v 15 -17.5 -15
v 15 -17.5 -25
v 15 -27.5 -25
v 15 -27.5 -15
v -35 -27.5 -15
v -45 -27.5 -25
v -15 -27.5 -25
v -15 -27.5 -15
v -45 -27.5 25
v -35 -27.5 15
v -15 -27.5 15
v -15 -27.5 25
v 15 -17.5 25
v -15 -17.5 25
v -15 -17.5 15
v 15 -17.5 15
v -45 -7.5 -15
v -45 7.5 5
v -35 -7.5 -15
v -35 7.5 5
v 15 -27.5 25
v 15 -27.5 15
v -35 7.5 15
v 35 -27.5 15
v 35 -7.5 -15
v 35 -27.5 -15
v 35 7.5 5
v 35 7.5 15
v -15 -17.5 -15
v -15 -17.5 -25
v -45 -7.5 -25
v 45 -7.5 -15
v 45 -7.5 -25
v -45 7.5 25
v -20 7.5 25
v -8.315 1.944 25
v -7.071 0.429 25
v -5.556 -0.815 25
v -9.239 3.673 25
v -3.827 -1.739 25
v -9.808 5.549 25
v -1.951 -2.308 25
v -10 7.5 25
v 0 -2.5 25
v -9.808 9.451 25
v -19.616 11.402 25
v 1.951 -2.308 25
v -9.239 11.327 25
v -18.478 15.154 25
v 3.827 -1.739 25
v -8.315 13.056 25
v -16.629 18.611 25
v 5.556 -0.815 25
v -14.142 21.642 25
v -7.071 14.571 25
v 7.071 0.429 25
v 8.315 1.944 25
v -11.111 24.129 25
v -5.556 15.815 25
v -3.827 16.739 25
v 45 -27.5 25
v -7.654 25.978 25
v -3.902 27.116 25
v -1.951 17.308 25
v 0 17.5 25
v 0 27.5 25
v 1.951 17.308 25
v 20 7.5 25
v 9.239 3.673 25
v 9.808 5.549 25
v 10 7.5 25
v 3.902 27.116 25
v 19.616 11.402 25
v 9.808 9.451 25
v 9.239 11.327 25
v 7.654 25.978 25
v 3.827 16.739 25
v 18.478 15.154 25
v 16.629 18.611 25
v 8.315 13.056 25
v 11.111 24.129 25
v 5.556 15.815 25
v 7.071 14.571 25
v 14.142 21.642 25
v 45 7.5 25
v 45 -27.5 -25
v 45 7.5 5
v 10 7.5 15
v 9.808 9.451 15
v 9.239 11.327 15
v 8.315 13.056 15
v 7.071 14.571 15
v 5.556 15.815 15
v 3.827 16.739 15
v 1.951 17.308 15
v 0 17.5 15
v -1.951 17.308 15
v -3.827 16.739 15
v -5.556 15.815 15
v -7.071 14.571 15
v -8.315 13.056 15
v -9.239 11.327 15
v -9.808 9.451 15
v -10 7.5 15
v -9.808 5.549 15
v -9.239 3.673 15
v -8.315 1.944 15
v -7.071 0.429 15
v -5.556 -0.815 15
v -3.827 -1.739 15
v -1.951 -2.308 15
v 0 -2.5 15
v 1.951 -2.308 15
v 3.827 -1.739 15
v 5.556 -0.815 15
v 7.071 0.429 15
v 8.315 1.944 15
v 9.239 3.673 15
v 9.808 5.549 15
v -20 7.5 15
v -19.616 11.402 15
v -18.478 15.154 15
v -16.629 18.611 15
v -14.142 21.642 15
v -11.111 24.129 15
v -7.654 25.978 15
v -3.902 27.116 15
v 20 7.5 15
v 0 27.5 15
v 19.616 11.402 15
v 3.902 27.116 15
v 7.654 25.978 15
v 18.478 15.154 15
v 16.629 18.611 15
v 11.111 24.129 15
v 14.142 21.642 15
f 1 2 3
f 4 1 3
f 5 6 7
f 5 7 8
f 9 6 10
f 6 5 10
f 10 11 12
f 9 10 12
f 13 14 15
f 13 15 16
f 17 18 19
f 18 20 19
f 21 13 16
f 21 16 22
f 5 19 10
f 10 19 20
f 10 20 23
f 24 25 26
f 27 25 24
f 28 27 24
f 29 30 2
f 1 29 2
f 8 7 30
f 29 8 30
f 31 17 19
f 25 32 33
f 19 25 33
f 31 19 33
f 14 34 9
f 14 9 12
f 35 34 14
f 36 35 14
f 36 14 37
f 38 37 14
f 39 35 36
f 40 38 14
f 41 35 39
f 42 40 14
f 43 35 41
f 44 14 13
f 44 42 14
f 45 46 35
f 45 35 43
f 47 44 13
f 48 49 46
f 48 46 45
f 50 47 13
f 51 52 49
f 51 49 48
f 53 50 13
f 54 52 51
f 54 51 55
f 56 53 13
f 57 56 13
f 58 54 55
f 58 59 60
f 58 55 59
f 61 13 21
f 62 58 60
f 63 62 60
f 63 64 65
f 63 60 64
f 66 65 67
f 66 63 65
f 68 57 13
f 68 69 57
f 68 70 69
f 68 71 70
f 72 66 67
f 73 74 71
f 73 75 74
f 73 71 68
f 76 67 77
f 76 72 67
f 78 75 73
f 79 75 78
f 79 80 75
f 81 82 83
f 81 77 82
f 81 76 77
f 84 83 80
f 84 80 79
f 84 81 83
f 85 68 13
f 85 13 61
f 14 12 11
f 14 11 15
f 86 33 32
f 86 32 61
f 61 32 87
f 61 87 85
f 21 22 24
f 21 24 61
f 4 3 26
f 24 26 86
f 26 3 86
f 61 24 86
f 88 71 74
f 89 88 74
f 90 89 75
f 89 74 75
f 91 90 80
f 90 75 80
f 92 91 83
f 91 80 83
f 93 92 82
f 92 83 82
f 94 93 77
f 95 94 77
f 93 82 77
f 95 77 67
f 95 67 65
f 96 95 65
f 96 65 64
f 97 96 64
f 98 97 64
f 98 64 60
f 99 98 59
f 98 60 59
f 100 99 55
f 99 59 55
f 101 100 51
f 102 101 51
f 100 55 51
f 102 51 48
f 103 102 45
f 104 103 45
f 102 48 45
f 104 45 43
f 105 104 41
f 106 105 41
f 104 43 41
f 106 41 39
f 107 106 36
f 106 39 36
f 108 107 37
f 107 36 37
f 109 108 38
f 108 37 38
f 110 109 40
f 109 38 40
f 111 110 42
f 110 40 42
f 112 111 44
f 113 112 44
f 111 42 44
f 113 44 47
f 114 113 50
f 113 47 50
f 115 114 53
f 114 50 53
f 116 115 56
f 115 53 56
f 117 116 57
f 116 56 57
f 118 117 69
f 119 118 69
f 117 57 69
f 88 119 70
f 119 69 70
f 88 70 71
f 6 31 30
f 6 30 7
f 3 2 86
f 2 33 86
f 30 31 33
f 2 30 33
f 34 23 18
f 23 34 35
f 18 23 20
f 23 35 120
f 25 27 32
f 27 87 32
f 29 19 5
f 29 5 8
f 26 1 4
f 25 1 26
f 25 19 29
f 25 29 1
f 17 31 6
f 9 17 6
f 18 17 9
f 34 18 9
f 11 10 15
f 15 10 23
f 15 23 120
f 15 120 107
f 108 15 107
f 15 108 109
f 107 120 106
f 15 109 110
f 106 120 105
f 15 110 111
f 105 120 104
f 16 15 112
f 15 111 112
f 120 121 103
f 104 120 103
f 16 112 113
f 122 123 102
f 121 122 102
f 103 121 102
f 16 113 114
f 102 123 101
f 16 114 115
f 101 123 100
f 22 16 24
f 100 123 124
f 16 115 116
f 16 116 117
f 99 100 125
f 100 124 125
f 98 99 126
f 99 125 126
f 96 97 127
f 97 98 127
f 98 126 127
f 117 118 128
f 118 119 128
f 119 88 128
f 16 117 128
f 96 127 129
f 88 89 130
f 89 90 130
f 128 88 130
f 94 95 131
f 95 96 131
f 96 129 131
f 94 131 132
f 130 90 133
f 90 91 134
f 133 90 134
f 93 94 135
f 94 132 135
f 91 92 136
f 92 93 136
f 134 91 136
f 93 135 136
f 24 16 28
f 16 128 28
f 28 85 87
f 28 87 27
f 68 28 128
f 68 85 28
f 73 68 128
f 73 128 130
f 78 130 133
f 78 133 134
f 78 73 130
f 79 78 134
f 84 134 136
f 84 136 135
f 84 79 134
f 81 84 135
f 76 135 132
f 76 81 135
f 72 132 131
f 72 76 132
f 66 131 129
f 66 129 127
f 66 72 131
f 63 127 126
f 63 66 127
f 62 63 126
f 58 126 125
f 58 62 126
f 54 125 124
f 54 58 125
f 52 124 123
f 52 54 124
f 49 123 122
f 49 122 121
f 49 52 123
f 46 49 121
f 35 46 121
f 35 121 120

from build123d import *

# Parameters (mm, degrees)
BOSS_EXTRUDE1_DEPTH = 10
BOSS_EXTRUDE2_DEPTH = 5
SKETCH3_R           = 10
BOSS_EXTRUDE3_DEPTH = 10


with BuildPart() as part:
    # Sketch1 → Boss-Extrude1 (new body)
    with BuildSketch(Plane.XY):
        Polygon((-45, -27.5), (-15, -27.5), (-15, -17.5), (15, -17.5), (15, -27.5), (45, -27.5), (45, -7.5), (-45, -7.5), align=None)
    extrude(amount=BOSS_EXTRUDE1_DEPTH)


with BuildPart() as body_2:
    # Sketch2 → Boss-Extrude2 (new, symmetric)
    with BuildSketch(Plane(origin=(0, 0, 0), x_dir=(0, 0, -1), z_dir=(1, 0, 0))):
        Polygon((0, -27.5), (-50, -27.5), (-50, 7.5), (-30, 7.5), (-10, -7.5), (0, -7.5), align=None)
    extrude(amount=BOSS_EXTRUDE2_DEPTH, both=True)


with BuildPart() as body_3:
    # Sketch3 → Boss-Extrude3 (new body)
    with BuildSketch(Plane.XY):
        with BuildLine():
            Line((-45, -27.5), (-15, -27.5))
            Line((-15, -27.5), (-15, -17.5))
            Line((-15, -17.5), (15, -17.5))
            Line((15, -17.5), (15, -27.5))
            Line((15, -27.5), (45, -27.5))
            Line((45, -27.5), (45, 7.5))
            Line((45, 7.5), (20, 7.5))
            ThreePointArc((20, 7.5), (0, 27.5), (-20, 7.5))
            Line((-20, 7.5), (-45, 7.5))
            Line((-45, 7.5), (-45, -27.5))
        make_face()
        with Locations((0, 7.5)):
            Circle(SKETCH3_R, mode=Mode.SUBTRACT)
    extrude(amount=-BOSS_EXTRUDE3_DEPTH)


with BuildPart() as body_3_1:
    # Body-Move/Copy1: moved
    add(body_3.part.moved(Location((0, 0, 50))))


with BuildPart() as body_2_1:
    # Body-Move/Copy2: moved
    add(body_2.part.moved(Location((40, 0, 0))))


with BuildPart() as body_4:
    # Body-Move/Copy3: copy of body 2
    add(body_2_1.part.moved(Location((-80, 0, 0))))


with BuildPart() as body_2_2:
    add(body_2_1.part)

    # Combine1: union body 3, body 4, part
    add(body_3_1.part)
    add(body_4.part)
    add(part.part)


with BuildPart() as body_2_3:
    # Body-Move/Copy5: moved
    add(body_2_2.part.moved(Location((0, 0, -25))))


solid = body_2_3.part
